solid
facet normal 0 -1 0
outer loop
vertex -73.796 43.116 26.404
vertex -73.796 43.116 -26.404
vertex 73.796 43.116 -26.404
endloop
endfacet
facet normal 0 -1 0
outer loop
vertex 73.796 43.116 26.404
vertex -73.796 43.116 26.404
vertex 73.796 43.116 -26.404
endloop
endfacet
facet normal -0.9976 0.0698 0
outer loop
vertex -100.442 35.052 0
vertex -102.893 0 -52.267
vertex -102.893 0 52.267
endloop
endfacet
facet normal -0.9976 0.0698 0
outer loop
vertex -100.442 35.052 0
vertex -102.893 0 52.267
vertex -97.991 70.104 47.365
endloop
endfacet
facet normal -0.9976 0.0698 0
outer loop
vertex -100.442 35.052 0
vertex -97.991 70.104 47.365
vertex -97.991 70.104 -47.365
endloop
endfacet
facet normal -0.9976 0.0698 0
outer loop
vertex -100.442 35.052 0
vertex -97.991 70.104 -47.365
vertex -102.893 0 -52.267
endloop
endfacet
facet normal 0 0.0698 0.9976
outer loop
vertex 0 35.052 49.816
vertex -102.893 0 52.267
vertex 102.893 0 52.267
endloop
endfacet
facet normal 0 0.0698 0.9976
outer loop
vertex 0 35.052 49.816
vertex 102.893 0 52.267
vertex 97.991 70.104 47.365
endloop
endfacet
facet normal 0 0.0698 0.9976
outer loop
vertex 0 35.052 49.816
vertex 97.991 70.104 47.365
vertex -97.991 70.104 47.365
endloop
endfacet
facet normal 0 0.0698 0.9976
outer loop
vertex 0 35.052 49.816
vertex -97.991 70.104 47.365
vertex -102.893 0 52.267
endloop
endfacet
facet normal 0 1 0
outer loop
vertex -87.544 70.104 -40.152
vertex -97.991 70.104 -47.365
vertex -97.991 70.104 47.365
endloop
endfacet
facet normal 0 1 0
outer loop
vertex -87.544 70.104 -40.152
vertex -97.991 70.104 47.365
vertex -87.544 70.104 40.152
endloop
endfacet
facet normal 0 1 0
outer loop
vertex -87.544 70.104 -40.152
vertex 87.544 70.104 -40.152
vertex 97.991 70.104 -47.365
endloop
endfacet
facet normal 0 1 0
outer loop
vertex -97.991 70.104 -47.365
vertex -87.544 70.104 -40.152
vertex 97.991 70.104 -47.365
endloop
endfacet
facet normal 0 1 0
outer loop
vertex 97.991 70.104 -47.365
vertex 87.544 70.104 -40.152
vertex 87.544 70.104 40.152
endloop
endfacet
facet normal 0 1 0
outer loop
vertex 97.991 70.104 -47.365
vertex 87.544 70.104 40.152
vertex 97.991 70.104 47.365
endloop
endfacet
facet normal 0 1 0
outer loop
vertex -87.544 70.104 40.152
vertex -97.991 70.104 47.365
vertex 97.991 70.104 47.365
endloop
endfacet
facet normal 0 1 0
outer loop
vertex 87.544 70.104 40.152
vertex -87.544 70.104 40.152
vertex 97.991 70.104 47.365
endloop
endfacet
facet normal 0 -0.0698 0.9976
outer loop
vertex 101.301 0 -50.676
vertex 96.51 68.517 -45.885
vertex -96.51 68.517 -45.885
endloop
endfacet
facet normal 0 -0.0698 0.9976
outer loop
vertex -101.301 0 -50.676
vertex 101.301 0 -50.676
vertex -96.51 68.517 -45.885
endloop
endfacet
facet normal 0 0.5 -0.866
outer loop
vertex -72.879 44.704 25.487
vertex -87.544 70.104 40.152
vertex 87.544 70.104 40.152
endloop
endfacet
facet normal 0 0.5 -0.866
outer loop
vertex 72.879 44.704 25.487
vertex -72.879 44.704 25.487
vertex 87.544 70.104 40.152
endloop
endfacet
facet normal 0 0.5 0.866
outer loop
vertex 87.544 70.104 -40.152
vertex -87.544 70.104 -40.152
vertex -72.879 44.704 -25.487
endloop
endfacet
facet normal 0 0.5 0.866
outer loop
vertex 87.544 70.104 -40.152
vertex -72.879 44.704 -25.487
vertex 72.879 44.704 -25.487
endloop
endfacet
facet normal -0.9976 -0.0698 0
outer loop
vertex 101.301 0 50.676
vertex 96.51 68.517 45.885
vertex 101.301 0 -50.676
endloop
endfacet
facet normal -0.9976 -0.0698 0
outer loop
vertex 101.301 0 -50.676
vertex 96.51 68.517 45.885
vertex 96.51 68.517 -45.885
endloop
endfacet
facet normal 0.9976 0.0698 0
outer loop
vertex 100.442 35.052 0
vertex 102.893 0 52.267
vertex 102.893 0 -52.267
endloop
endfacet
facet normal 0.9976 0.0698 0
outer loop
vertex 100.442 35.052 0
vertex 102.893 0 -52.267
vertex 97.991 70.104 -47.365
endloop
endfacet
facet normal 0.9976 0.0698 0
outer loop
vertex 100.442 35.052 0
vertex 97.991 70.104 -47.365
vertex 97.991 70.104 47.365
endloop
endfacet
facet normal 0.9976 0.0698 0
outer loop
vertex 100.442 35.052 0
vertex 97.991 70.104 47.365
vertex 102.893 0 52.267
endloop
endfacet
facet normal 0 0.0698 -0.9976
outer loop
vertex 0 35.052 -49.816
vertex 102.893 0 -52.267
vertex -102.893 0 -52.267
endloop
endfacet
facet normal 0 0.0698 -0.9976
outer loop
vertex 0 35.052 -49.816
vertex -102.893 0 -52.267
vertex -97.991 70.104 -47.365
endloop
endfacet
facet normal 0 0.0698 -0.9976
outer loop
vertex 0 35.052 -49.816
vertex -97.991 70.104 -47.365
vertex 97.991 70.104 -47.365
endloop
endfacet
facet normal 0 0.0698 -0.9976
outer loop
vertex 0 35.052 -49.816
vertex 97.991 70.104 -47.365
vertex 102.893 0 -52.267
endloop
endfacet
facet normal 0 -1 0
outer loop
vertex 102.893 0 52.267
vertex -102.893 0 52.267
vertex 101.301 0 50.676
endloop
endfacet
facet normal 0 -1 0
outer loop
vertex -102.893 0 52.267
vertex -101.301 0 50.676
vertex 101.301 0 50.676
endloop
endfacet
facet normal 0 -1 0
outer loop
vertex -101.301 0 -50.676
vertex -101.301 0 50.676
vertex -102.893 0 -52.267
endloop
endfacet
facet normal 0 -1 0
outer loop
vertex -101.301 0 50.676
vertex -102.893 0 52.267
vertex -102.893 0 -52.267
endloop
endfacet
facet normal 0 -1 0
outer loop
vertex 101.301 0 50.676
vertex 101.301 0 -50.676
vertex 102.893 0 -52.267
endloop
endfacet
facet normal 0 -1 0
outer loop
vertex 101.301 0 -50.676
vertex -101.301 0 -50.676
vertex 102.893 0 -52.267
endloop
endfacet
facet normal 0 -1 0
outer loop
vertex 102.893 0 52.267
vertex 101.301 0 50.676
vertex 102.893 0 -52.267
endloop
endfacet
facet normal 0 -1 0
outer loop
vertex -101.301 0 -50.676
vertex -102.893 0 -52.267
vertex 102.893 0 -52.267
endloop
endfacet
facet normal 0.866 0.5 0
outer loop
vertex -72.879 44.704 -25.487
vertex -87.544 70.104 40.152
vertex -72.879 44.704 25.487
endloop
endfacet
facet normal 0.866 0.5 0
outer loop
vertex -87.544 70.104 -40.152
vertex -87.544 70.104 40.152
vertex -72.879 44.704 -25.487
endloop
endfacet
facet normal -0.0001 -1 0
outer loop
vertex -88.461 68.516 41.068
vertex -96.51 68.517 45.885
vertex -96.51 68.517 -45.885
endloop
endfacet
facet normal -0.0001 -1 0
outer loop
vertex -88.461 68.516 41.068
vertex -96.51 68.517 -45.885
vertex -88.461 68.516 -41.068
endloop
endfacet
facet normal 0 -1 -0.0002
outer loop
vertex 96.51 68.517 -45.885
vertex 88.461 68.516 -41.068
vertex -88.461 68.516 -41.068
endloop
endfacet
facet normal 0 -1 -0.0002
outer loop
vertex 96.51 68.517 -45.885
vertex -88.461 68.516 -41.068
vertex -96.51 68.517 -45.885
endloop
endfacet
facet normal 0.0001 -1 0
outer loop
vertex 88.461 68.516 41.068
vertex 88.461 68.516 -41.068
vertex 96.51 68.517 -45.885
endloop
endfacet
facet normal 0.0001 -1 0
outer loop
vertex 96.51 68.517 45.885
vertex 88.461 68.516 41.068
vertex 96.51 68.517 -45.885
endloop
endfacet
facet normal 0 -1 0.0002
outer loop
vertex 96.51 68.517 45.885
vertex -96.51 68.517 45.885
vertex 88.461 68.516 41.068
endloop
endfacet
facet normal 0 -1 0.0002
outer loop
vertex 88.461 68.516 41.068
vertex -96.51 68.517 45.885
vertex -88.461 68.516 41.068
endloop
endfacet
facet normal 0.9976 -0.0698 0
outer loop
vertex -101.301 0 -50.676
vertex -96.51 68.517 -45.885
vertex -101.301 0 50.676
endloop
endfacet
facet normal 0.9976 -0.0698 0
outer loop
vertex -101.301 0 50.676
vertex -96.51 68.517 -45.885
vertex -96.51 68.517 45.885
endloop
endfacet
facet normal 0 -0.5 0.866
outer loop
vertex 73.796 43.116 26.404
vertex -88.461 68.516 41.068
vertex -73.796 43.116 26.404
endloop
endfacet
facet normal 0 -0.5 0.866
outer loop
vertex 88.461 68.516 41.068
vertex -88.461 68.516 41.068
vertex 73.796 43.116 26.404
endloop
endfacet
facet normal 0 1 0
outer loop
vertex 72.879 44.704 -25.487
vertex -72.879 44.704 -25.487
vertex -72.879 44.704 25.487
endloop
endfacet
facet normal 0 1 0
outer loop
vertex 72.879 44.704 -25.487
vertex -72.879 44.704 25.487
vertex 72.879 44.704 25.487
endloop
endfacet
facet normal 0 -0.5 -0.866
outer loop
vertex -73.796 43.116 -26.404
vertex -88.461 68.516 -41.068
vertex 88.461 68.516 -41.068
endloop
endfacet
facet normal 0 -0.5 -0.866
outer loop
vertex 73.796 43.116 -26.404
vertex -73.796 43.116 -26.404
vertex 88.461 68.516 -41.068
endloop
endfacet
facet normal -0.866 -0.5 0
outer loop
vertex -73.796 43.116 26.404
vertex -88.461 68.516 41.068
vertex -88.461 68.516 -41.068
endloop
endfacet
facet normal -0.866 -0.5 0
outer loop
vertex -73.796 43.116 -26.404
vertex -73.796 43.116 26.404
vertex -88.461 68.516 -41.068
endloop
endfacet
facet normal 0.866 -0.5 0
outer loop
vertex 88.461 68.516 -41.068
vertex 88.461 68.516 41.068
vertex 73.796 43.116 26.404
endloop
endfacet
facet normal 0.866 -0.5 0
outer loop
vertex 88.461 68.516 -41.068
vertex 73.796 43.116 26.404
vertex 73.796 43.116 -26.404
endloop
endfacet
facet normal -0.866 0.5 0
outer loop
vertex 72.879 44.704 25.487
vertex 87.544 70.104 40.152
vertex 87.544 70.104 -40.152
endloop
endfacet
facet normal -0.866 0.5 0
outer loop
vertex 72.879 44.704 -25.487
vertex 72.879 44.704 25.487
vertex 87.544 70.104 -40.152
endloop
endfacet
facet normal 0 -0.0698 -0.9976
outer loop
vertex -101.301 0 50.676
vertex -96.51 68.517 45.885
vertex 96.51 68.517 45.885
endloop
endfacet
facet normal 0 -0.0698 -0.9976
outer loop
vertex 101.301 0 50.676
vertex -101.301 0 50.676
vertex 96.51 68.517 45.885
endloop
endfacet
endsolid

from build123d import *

# Parameters (mm, degrees)
SKETCH1_W           = 205.785682804
SKETCH1_H           = 104.534748446
BOSS_EXTRUDE1_DEPTH = 70.104
BOSS_EXTRUDE1_TAPER = 4
SKETCH2_W           = 145.758865666
SKETCH2_H           = 50.974097726
CUT_EXTRUDE1_DEPTH  = 25.4
DRAFT1_ANGLE        = 30
SHELL1_T            = -1.5875


with BuildPart() as part:
    # Sketch1 → Boss-Extrude1 (new body)
    with BuildSketch(Plane(origin=(0, 0, 0), x_dir=(1, 0, 0), z_dir=(0, 1, 0))):
        Rectangle(SKETCH1_W, SKETCH1_H)
    extrude(amount=BOSS_EXTRUDE1_DEPTH, taper=BOSS_EXTRUDE1_TAPER)

    # Sketch2 → Cut-Extrude1 (cut)
    with BuildSketch(Plane(origin=(0, 70.104, 0), x_dir=(1, 0, 0), z_dir=(0, 1, 0))):
        Rectangle(SKETCH2_W, SKETCH2_H)
    extrude(amount=-CUT_EXTRUDE1_DEPTH, mode=Mode.SUBTRACT)

    # Draft1
    draft1_faces = [part.faces().sort_by_distance(p)[0] for p in [
        (0, 57.404, 25.487048863),
        (72.879432833, 57.404, 0),
        (0, 57.404, -25.487048863),
        (-72.879432833, 57.404, 0),
    ]]
    draft(draft1_faces, Plane.ZX.offset(44.704), DRAFT1_ANGLE)

    # Shell1
    shell1_openings = [part.faces().sort_by_distance(p)[0] for p in [
        (0, 0, 0),
    ]]
    offset(amount=SHELL1_T, openings=shell1_openings, kind=Kind.INTERSECTION)


solid = part.part
